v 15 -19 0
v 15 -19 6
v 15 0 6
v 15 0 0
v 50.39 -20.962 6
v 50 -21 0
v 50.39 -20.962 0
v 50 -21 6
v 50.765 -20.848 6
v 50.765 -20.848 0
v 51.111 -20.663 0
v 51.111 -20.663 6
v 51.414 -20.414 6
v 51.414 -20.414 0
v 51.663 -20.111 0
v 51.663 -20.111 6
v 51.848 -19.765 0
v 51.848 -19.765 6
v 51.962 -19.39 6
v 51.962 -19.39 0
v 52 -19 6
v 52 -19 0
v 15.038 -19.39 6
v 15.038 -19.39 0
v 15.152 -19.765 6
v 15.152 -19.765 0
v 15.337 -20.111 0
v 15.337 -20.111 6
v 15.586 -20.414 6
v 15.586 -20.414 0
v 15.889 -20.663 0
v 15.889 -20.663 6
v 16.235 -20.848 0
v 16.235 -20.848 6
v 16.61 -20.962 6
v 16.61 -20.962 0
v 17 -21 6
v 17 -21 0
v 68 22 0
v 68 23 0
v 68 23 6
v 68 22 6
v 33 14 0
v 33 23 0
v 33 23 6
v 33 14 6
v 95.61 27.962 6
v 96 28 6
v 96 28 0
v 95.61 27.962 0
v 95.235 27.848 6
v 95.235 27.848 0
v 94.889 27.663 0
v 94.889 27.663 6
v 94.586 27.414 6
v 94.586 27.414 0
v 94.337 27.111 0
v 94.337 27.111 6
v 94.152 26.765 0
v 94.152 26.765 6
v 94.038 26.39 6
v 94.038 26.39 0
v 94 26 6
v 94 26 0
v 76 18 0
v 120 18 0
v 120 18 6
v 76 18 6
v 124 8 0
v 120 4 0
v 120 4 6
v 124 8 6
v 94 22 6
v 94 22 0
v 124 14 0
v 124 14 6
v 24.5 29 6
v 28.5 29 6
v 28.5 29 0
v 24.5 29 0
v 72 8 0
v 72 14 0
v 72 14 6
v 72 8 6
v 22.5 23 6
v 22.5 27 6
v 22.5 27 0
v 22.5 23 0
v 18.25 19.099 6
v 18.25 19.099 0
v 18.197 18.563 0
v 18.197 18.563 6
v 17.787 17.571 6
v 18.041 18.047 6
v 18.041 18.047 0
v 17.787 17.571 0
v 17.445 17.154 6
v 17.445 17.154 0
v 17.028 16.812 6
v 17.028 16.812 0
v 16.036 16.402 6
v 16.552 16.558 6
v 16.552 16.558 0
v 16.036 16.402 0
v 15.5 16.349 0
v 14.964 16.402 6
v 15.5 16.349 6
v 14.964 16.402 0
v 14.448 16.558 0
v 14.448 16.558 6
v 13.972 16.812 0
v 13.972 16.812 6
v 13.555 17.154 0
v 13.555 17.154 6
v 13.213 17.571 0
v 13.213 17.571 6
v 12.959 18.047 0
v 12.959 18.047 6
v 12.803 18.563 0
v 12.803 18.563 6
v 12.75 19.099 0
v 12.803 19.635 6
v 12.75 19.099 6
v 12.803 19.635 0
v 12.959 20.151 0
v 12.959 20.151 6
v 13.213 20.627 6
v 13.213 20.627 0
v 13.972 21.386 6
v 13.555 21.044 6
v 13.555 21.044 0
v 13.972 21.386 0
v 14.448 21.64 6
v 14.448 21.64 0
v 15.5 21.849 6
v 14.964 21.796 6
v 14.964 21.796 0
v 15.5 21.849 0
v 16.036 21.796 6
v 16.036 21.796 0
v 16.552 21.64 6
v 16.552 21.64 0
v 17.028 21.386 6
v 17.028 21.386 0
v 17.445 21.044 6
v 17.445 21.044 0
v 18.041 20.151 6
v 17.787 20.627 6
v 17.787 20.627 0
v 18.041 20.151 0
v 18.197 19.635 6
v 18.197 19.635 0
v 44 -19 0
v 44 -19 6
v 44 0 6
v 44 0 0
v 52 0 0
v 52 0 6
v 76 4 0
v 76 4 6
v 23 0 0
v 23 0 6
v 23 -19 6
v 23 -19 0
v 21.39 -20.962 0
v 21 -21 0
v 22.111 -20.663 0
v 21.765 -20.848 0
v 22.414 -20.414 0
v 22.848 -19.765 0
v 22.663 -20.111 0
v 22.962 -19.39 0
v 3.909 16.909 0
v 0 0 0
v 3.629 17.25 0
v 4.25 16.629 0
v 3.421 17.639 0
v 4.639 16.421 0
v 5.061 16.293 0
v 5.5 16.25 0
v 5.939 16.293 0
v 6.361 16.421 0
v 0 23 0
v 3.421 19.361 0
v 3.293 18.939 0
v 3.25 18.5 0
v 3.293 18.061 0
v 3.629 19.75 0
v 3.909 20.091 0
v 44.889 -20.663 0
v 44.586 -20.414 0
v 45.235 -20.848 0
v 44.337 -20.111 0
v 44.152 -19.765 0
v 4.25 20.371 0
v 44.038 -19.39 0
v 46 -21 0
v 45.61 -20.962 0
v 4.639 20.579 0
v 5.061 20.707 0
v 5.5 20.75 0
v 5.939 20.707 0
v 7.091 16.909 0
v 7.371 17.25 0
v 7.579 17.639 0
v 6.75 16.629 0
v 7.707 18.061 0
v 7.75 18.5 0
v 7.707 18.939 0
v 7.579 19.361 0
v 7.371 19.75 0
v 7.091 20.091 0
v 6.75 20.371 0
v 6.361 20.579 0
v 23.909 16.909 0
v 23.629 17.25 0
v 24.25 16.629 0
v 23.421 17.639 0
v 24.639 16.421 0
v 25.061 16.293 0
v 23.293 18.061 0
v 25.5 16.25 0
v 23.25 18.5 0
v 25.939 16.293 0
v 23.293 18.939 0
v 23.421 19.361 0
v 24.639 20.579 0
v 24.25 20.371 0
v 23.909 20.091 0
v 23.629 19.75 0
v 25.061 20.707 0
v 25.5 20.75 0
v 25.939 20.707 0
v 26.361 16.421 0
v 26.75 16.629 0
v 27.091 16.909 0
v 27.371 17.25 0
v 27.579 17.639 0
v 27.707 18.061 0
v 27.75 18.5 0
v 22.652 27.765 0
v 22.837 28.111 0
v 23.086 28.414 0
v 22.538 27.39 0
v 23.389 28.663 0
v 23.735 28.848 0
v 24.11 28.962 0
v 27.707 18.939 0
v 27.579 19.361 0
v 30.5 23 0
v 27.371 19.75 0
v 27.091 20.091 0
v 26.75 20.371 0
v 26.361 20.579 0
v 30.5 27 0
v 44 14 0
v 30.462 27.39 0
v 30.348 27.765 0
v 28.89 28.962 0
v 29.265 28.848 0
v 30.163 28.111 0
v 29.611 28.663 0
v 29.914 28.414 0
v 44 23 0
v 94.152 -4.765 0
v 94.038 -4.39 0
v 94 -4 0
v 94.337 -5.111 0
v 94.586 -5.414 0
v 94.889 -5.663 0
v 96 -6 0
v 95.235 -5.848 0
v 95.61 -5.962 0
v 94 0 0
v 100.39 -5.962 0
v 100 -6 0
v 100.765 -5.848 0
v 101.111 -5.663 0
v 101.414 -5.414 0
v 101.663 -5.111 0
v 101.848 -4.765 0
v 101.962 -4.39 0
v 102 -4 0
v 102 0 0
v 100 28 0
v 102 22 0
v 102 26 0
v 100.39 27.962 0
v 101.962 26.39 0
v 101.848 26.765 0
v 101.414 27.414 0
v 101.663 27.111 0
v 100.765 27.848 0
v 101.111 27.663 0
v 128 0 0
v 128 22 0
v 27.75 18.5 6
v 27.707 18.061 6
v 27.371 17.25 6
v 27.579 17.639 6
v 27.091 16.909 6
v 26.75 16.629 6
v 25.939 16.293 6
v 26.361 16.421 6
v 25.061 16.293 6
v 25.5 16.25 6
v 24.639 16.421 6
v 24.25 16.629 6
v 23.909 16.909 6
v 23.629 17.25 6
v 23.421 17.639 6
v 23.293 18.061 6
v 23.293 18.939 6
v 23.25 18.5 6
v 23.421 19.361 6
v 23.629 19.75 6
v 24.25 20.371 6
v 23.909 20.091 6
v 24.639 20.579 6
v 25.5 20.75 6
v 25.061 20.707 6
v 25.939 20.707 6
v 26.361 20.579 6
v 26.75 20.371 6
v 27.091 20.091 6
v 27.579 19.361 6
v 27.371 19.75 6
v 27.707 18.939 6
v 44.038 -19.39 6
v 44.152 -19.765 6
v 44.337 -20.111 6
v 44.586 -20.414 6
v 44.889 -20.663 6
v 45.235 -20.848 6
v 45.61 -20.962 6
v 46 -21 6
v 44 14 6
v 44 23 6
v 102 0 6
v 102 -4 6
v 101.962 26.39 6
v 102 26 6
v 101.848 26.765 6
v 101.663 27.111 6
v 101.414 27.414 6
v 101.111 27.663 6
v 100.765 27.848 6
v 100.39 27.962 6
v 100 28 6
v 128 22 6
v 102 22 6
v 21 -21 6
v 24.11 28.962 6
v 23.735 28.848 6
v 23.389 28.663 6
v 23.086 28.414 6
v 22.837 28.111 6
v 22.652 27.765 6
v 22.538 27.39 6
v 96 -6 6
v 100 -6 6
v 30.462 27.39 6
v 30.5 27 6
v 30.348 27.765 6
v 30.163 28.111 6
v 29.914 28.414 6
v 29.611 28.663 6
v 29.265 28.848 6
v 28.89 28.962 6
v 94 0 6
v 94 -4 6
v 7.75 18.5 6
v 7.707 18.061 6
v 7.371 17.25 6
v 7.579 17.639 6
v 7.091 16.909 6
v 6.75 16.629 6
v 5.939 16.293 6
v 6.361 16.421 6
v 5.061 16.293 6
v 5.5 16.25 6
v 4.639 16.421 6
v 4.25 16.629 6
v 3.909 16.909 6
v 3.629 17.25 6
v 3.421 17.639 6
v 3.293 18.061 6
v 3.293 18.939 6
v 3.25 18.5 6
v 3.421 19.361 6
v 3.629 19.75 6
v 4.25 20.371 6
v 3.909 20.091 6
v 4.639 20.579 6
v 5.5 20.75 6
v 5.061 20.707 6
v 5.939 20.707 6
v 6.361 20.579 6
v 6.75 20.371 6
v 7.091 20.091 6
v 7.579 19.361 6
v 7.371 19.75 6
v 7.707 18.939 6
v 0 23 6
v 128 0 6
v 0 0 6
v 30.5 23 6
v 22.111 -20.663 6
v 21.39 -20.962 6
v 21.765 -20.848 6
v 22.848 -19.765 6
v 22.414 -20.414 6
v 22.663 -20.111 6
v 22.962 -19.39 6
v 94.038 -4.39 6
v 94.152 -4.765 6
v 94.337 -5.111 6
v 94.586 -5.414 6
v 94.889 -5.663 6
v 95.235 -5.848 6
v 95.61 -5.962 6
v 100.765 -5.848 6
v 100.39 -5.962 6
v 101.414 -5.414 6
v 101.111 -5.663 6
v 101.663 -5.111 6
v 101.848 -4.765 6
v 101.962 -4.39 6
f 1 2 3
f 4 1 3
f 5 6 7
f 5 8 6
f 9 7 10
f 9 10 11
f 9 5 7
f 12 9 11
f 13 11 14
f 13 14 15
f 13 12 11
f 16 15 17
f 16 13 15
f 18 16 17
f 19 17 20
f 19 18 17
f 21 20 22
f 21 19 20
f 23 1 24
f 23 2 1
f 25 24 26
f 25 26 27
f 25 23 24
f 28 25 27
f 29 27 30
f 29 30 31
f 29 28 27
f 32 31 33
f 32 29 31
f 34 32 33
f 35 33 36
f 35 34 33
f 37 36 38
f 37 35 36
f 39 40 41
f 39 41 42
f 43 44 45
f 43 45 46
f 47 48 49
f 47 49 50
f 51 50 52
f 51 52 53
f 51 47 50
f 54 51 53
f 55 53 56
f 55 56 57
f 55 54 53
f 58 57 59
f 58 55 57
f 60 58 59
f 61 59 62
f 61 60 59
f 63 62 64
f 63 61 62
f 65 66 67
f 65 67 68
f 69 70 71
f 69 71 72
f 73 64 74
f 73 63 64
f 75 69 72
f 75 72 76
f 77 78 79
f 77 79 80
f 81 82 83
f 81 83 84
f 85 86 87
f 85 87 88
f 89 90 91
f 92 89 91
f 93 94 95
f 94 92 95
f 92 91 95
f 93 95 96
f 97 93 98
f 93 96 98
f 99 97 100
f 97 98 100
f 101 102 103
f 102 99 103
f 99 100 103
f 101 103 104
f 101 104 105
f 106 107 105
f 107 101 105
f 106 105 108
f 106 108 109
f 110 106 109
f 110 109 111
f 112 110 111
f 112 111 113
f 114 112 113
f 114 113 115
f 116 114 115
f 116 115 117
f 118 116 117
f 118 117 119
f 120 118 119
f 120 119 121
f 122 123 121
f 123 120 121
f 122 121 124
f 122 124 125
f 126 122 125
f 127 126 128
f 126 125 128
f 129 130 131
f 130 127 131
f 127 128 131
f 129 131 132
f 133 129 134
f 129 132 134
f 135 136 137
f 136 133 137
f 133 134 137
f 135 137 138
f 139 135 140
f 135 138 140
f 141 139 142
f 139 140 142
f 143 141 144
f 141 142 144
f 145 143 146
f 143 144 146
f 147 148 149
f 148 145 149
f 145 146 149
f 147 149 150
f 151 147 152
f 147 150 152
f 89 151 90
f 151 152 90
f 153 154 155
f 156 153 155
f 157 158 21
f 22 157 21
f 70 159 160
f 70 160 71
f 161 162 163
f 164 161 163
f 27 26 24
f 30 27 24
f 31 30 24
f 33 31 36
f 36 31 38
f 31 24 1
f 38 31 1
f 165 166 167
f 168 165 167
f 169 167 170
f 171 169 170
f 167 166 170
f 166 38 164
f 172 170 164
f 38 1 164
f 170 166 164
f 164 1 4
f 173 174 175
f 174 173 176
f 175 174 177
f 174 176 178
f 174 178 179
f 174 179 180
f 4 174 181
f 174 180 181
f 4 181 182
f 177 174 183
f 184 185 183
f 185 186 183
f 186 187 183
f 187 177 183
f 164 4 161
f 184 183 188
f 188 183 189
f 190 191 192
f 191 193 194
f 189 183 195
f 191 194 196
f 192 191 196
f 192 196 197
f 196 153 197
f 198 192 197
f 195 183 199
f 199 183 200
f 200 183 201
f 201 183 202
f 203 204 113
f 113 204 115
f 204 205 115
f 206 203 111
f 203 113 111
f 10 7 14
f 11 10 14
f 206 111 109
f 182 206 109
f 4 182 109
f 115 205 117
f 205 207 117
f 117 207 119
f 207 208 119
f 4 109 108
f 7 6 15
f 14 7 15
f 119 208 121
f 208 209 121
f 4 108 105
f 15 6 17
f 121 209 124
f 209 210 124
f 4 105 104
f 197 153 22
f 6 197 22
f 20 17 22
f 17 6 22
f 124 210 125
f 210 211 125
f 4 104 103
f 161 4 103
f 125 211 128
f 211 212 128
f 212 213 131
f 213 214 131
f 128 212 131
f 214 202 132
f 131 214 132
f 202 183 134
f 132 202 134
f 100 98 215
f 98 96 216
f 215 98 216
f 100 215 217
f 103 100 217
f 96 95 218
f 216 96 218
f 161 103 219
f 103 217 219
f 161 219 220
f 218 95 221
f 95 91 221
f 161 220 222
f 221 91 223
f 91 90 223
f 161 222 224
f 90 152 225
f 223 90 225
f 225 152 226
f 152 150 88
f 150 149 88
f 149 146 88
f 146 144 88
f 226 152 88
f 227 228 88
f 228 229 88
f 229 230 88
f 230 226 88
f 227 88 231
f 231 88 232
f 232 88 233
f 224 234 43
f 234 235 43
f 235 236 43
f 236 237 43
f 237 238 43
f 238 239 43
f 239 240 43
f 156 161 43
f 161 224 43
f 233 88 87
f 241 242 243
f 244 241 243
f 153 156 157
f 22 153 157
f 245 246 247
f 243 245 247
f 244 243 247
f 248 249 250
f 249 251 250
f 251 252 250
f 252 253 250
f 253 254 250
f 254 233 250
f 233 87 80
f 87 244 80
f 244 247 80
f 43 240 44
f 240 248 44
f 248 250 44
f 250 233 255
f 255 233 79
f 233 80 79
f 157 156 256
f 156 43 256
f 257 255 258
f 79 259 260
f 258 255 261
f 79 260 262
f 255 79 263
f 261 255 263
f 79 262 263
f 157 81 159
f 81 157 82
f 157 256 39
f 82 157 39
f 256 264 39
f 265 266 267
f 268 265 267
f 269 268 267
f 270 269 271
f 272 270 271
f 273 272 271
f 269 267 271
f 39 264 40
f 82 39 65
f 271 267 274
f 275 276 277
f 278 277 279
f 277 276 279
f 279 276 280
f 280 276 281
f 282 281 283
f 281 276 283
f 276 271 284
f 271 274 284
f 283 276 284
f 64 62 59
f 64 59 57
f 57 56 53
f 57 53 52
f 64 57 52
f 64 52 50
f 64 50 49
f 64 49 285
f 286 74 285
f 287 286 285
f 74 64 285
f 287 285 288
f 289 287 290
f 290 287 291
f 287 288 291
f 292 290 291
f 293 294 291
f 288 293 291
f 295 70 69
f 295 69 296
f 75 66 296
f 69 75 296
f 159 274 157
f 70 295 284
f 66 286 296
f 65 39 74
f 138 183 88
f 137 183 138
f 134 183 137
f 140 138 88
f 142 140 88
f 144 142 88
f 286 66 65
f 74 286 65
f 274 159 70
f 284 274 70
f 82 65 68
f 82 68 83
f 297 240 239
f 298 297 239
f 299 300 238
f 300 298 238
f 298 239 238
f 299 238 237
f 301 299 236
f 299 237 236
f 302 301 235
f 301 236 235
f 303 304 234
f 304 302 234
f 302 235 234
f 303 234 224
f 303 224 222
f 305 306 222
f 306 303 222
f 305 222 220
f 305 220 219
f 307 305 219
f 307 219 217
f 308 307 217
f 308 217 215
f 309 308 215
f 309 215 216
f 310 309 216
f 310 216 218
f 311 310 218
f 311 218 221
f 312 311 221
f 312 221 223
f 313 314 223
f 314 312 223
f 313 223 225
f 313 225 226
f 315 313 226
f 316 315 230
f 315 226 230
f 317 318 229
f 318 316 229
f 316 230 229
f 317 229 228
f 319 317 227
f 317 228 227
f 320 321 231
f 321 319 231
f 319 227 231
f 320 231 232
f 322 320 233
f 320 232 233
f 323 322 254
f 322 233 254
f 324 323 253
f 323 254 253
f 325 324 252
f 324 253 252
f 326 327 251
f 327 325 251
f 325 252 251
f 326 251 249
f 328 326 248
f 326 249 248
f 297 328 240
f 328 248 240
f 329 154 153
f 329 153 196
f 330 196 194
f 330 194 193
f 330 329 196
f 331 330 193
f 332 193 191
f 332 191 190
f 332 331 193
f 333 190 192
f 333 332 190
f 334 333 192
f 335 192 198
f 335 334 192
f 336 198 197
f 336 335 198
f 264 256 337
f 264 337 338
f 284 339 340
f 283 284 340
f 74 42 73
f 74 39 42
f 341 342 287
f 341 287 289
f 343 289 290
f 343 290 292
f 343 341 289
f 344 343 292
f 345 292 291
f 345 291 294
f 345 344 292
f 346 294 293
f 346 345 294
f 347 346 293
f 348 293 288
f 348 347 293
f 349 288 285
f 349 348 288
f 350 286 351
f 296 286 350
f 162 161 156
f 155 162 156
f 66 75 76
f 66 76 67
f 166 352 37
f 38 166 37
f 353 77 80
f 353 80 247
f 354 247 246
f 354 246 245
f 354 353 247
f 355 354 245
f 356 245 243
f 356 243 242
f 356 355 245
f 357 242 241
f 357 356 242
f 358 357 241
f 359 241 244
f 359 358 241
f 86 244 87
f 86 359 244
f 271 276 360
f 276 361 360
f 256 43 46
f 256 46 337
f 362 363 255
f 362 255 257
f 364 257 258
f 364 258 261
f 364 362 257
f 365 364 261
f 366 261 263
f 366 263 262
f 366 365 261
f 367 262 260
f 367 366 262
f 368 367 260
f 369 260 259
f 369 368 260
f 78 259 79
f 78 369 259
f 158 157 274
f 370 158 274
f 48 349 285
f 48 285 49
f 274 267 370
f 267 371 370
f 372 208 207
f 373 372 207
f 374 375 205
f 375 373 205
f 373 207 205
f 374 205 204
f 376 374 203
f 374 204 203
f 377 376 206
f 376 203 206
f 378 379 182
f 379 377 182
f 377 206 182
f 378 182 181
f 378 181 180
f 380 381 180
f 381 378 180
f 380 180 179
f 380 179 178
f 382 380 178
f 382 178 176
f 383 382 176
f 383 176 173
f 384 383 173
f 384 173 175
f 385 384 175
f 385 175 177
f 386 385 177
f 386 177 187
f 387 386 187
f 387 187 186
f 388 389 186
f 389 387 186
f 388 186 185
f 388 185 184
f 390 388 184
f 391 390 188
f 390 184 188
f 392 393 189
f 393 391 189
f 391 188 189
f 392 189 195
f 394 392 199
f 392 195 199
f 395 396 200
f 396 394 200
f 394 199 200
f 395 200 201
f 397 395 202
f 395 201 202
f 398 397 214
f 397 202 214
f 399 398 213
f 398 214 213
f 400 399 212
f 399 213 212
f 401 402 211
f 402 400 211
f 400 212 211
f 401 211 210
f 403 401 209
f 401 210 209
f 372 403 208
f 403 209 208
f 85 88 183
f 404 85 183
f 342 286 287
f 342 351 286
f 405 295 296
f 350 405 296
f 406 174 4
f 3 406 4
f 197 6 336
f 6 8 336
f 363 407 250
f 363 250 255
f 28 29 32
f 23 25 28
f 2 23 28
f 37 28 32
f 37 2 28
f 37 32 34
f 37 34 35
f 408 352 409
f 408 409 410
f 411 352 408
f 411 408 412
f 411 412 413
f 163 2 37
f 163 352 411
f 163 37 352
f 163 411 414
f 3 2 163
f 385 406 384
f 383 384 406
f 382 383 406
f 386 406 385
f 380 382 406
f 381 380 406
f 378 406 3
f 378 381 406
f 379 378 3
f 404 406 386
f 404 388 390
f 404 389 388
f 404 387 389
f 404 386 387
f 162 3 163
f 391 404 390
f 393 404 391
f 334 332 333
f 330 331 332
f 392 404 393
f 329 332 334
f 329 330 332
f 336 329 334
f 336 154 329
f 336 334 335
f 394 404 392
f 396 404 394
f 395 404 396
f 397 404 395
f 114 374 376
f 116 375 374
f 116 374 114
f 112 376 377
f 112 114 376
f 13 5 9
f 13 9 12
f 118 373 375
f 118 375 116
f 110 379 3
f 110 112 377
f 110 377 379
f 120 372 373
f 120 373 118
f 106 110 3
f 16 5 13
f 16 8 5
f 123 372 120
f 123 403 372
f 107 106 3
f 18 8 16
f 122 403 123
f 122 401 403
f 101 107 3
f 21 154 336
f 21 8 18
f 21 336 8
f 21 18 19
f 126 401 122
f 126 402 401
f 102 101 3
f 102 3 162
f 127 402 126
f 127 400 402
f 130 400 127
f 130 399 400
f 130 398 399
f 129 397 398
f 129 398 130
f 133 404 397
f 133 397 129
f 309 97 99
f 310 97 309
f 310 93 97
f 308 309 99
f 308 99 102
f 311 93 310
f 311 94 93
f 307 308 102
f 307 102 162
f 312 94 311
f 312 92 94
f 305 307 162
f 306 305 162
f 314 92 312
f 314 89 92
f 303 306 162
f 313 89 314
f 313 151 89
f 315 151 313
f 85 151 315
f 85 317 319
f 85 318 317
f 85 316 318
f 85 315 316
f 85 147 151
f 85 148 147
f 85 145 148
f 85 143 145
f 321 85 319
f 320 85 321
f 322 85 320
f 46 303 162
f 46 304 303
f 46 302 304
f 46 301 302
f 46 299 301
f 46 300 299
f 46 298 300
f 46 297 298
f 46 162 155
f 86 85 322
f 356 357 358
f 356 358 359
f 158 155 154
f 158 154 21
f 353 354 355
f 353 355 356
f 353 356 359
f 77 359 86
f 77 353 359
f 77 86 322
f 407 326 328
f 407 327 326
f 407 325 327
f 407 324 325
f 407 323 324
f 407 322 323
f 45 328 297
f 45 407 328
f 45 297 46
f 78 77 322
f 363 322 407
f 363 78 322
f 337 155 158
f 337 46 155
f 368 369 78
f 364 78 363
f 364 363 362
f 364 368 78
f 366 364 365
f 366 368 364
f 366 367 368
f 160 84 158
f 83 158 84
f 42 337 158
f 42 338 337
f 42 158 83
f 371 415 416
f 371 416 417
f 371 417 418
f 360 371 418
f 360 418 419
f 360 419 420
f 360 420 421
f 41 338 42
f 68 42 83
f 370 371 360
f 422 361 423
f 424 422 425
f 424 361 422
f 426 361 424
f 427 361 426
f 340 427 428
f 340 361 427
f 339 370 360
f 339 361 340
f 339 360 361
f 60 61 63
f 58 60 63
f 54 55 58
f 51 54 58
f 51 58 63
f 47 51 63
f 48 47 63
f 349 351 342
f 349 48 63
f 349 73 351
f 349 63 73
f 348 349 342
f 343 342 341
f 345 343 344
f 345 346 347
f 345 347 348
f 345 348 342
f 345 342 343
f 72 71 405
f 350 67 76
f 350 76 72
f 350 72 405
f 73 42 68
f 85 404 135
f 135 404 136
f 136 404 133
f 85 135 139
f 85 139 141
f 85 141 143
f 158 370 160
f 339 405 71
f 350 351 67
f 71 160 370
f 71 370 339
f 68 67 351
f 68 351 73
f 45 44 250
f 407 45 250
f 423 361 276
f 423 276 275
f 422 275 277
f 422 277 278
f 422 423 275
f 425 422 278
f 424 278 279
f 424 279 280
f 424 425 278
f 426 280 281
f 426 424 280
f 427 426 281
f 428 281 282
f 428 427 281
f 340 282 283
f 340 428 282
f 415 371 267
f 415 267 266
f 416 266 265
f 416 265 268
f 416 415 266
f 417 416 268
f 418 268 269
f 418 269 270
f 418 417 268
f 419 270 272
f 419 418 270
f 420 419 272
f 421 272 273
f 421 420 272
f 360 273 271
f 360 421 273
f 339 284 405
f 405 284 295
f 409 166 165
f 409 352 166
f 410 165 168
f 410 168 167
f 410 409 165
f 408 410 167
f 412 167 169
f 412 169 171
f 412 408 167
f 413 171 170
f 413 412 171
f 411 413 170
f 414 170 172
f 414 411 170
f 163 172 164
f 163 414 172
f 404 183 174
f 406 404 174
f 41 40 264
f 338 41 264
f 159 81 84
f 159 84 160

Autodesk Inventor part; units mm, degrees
ref_plane "YZ Plane" through (0, 0, 0) normal (1, 0, 0) x (0, 1, 0)
ref_plane "XZ Plane" through (0, 0, 0) normal (0, 1, 0) x (-1, 0, 0)
ref_plane "XY Plane" through (0, 0, 0) normal (0, 0, 1) x (1, 0, 0)
sketch "Sketch1" plane through (0, 0, 0) normal (0, 0, 1) x (1, 0, 0)
  line L0 (0, 0) -> (128, 0)
  line L1 (128, 0) -> (128, 22)
  line L2 (0, 23) -> (0, 0)
  line L3 (68, 23) -> (68, 22)
  line L4 (68, 22) -> (128, 22)
  line L5 (33, 23) -> (33, 14)
  line L6 (33, 14) -> (44, 14)
  line L7 (44, 14) -> (44, 23)
  line L8 (68, 23) -> (44, 23)
  line L9 (33, 23) -> (0, 23)
  line L10 (72, 14) -> (72, 8)
  line L11 (72, 8) -> (76, 4)
  line L12 (76, 4) -> (120, 4)
  line L13 (120, 4) -> (124, 8)
  line L14 (124, 8) -> (124, 14)
  line L15 (124, 14) -> (120, 18)
  line L16 (120, 18) -> (76, 18)
  line L17 (76, 18) -> (72, 14)
  line L18 (68, 22) -> (68, 0) construction
  circle A0 centre (5.5, 18.5) radius 2.25
  circle A1 centre (25.5, 18.5) radius 2.25
  circle A2 centre (15.5, 19.099) radius 2.75
  circle A3 centre (38.5, 19.099) radius 7.5 construction
  circle A4 centre (38.5, 19.099) radius 4 construction
  point P0 (33, 18.5)
  dimension "d0" = 128
  dimension "d1" = 23
  dimension "d2" = 22
  dimension "d3" = 60
  dimension "d4" = 11
  dimension "d5" = 9
  dimension "d6" = 33
  dimension "d7" = 45
  dimension "d8" = 4
  dimension "d9" = 4
  dimension "d10" = 4
  dimension "d11" = 4
  dimension "d12" = 4
  dimension "d13" = 4.5
  dimension "d14" = 4.5
  dimension "d15" = 5.5
  dimension "d16" = 20
  dimension "d17" = 5.5
  dimension "d18" = 8
  dimension "d19" = 15
  dimension "d20" = 10
extrude "Extrusion1" add sketch "Sketch1" along normal blind 6
sketch "Sketch2" plane through (0, 0, 6) normal (0, 0, 1) x (1, 0, 0)
  line L0 (0, 0) -> (128, 0) projected
  line L1 (128, 0) -> (128, 22) projected
  line L2 (128, 22) -> (68, 22) projected
  line L3 (33, 23) -> (0, 23) projected
  line L4 (0, 23) -> (0, 0) projected
  line L5 (22.5, 23) -> (30.5, 23)
  line L6 (30.5, 23) -> (30.5, 27)
  line L7 (28.5, 29) -> (24.5, 29)
  line L8 (22.5, 27) -> (22.5, 23)
  line L9 (94, 22) -> (102, 22)
  line L10 (102, 22) -> (102, 26)
  line L11 (100, 28) -> (96, 28)
  line L12 (94, 26) -> (94, 22)
  line L13 (15, 0) -> (23, 0)
  line L14 (23, 0) -> (23, -19)
  line L15 (21, -21) -> (17, -21)
  line L16 (15, -19) -> (15, 0)
  line L17 (44, 0) -> (52, 0)
  line L18 (52, 0) -> (52, -19)
  line L19 (50, -21) -> (46, -21)
  line L20 (44, -19) -> (44, 0)
  line L21 (94, 0) -> (102, 0)
  line L22 (102, 0) -> (102, -4)
  line L23 (100, -6) -> (96, -6)
  line L24 (94, -4) -> (94, 0)
  arc A0 (24.5, 29) -> (22.5, 27) centre (24.5, 27) ccw
  arc A1 (30.5, 27) -> (28.5, 29) centre (28.5, 27) ccw
  arc A2 (96, 28) -> (94, 26) centre (96, 26) ccw
  arc A3 (102, 26) -> (100, 28) centre (100, 26) ccw
  arc A4 (15, -19) -> (17, -21) centre (17, -19) ccw
  arc A5 (21, -21) -> (23, -19) centre (21, -19) ccw
  arc A6 (44, -19) -> (46, -21) centre (46, -19) ccw
  arc A7 (50, -21) -> (52, -19) centre (50, -19) ccw
  arc A8 (94, -4) -> (96, -6) centre (96, -4) ccw
  arc A9 (100, -6) -> (102, -4) centre (100, -4) ccw
  dimension "d23" = 2
  dimension "d24" = 8
  dimension "d25" = 8
  dimension "d26" = 8
  dimension "d27" = 8
  dimension "d28" = 8
  dimension "d29" = 21
  dimension "d30" = 6
  dimension "d31" = 6
  dimension "d32" = 22.5
  dimension "d33" = 26
  dimension "d34" = 15
  dimension "d35" = 21
  dimension "d38" = 6
extrude "Extrusion2" add sketch "Sketch2" against normal blind 6
properties part number "x_iddler_upper_nut_stop"
